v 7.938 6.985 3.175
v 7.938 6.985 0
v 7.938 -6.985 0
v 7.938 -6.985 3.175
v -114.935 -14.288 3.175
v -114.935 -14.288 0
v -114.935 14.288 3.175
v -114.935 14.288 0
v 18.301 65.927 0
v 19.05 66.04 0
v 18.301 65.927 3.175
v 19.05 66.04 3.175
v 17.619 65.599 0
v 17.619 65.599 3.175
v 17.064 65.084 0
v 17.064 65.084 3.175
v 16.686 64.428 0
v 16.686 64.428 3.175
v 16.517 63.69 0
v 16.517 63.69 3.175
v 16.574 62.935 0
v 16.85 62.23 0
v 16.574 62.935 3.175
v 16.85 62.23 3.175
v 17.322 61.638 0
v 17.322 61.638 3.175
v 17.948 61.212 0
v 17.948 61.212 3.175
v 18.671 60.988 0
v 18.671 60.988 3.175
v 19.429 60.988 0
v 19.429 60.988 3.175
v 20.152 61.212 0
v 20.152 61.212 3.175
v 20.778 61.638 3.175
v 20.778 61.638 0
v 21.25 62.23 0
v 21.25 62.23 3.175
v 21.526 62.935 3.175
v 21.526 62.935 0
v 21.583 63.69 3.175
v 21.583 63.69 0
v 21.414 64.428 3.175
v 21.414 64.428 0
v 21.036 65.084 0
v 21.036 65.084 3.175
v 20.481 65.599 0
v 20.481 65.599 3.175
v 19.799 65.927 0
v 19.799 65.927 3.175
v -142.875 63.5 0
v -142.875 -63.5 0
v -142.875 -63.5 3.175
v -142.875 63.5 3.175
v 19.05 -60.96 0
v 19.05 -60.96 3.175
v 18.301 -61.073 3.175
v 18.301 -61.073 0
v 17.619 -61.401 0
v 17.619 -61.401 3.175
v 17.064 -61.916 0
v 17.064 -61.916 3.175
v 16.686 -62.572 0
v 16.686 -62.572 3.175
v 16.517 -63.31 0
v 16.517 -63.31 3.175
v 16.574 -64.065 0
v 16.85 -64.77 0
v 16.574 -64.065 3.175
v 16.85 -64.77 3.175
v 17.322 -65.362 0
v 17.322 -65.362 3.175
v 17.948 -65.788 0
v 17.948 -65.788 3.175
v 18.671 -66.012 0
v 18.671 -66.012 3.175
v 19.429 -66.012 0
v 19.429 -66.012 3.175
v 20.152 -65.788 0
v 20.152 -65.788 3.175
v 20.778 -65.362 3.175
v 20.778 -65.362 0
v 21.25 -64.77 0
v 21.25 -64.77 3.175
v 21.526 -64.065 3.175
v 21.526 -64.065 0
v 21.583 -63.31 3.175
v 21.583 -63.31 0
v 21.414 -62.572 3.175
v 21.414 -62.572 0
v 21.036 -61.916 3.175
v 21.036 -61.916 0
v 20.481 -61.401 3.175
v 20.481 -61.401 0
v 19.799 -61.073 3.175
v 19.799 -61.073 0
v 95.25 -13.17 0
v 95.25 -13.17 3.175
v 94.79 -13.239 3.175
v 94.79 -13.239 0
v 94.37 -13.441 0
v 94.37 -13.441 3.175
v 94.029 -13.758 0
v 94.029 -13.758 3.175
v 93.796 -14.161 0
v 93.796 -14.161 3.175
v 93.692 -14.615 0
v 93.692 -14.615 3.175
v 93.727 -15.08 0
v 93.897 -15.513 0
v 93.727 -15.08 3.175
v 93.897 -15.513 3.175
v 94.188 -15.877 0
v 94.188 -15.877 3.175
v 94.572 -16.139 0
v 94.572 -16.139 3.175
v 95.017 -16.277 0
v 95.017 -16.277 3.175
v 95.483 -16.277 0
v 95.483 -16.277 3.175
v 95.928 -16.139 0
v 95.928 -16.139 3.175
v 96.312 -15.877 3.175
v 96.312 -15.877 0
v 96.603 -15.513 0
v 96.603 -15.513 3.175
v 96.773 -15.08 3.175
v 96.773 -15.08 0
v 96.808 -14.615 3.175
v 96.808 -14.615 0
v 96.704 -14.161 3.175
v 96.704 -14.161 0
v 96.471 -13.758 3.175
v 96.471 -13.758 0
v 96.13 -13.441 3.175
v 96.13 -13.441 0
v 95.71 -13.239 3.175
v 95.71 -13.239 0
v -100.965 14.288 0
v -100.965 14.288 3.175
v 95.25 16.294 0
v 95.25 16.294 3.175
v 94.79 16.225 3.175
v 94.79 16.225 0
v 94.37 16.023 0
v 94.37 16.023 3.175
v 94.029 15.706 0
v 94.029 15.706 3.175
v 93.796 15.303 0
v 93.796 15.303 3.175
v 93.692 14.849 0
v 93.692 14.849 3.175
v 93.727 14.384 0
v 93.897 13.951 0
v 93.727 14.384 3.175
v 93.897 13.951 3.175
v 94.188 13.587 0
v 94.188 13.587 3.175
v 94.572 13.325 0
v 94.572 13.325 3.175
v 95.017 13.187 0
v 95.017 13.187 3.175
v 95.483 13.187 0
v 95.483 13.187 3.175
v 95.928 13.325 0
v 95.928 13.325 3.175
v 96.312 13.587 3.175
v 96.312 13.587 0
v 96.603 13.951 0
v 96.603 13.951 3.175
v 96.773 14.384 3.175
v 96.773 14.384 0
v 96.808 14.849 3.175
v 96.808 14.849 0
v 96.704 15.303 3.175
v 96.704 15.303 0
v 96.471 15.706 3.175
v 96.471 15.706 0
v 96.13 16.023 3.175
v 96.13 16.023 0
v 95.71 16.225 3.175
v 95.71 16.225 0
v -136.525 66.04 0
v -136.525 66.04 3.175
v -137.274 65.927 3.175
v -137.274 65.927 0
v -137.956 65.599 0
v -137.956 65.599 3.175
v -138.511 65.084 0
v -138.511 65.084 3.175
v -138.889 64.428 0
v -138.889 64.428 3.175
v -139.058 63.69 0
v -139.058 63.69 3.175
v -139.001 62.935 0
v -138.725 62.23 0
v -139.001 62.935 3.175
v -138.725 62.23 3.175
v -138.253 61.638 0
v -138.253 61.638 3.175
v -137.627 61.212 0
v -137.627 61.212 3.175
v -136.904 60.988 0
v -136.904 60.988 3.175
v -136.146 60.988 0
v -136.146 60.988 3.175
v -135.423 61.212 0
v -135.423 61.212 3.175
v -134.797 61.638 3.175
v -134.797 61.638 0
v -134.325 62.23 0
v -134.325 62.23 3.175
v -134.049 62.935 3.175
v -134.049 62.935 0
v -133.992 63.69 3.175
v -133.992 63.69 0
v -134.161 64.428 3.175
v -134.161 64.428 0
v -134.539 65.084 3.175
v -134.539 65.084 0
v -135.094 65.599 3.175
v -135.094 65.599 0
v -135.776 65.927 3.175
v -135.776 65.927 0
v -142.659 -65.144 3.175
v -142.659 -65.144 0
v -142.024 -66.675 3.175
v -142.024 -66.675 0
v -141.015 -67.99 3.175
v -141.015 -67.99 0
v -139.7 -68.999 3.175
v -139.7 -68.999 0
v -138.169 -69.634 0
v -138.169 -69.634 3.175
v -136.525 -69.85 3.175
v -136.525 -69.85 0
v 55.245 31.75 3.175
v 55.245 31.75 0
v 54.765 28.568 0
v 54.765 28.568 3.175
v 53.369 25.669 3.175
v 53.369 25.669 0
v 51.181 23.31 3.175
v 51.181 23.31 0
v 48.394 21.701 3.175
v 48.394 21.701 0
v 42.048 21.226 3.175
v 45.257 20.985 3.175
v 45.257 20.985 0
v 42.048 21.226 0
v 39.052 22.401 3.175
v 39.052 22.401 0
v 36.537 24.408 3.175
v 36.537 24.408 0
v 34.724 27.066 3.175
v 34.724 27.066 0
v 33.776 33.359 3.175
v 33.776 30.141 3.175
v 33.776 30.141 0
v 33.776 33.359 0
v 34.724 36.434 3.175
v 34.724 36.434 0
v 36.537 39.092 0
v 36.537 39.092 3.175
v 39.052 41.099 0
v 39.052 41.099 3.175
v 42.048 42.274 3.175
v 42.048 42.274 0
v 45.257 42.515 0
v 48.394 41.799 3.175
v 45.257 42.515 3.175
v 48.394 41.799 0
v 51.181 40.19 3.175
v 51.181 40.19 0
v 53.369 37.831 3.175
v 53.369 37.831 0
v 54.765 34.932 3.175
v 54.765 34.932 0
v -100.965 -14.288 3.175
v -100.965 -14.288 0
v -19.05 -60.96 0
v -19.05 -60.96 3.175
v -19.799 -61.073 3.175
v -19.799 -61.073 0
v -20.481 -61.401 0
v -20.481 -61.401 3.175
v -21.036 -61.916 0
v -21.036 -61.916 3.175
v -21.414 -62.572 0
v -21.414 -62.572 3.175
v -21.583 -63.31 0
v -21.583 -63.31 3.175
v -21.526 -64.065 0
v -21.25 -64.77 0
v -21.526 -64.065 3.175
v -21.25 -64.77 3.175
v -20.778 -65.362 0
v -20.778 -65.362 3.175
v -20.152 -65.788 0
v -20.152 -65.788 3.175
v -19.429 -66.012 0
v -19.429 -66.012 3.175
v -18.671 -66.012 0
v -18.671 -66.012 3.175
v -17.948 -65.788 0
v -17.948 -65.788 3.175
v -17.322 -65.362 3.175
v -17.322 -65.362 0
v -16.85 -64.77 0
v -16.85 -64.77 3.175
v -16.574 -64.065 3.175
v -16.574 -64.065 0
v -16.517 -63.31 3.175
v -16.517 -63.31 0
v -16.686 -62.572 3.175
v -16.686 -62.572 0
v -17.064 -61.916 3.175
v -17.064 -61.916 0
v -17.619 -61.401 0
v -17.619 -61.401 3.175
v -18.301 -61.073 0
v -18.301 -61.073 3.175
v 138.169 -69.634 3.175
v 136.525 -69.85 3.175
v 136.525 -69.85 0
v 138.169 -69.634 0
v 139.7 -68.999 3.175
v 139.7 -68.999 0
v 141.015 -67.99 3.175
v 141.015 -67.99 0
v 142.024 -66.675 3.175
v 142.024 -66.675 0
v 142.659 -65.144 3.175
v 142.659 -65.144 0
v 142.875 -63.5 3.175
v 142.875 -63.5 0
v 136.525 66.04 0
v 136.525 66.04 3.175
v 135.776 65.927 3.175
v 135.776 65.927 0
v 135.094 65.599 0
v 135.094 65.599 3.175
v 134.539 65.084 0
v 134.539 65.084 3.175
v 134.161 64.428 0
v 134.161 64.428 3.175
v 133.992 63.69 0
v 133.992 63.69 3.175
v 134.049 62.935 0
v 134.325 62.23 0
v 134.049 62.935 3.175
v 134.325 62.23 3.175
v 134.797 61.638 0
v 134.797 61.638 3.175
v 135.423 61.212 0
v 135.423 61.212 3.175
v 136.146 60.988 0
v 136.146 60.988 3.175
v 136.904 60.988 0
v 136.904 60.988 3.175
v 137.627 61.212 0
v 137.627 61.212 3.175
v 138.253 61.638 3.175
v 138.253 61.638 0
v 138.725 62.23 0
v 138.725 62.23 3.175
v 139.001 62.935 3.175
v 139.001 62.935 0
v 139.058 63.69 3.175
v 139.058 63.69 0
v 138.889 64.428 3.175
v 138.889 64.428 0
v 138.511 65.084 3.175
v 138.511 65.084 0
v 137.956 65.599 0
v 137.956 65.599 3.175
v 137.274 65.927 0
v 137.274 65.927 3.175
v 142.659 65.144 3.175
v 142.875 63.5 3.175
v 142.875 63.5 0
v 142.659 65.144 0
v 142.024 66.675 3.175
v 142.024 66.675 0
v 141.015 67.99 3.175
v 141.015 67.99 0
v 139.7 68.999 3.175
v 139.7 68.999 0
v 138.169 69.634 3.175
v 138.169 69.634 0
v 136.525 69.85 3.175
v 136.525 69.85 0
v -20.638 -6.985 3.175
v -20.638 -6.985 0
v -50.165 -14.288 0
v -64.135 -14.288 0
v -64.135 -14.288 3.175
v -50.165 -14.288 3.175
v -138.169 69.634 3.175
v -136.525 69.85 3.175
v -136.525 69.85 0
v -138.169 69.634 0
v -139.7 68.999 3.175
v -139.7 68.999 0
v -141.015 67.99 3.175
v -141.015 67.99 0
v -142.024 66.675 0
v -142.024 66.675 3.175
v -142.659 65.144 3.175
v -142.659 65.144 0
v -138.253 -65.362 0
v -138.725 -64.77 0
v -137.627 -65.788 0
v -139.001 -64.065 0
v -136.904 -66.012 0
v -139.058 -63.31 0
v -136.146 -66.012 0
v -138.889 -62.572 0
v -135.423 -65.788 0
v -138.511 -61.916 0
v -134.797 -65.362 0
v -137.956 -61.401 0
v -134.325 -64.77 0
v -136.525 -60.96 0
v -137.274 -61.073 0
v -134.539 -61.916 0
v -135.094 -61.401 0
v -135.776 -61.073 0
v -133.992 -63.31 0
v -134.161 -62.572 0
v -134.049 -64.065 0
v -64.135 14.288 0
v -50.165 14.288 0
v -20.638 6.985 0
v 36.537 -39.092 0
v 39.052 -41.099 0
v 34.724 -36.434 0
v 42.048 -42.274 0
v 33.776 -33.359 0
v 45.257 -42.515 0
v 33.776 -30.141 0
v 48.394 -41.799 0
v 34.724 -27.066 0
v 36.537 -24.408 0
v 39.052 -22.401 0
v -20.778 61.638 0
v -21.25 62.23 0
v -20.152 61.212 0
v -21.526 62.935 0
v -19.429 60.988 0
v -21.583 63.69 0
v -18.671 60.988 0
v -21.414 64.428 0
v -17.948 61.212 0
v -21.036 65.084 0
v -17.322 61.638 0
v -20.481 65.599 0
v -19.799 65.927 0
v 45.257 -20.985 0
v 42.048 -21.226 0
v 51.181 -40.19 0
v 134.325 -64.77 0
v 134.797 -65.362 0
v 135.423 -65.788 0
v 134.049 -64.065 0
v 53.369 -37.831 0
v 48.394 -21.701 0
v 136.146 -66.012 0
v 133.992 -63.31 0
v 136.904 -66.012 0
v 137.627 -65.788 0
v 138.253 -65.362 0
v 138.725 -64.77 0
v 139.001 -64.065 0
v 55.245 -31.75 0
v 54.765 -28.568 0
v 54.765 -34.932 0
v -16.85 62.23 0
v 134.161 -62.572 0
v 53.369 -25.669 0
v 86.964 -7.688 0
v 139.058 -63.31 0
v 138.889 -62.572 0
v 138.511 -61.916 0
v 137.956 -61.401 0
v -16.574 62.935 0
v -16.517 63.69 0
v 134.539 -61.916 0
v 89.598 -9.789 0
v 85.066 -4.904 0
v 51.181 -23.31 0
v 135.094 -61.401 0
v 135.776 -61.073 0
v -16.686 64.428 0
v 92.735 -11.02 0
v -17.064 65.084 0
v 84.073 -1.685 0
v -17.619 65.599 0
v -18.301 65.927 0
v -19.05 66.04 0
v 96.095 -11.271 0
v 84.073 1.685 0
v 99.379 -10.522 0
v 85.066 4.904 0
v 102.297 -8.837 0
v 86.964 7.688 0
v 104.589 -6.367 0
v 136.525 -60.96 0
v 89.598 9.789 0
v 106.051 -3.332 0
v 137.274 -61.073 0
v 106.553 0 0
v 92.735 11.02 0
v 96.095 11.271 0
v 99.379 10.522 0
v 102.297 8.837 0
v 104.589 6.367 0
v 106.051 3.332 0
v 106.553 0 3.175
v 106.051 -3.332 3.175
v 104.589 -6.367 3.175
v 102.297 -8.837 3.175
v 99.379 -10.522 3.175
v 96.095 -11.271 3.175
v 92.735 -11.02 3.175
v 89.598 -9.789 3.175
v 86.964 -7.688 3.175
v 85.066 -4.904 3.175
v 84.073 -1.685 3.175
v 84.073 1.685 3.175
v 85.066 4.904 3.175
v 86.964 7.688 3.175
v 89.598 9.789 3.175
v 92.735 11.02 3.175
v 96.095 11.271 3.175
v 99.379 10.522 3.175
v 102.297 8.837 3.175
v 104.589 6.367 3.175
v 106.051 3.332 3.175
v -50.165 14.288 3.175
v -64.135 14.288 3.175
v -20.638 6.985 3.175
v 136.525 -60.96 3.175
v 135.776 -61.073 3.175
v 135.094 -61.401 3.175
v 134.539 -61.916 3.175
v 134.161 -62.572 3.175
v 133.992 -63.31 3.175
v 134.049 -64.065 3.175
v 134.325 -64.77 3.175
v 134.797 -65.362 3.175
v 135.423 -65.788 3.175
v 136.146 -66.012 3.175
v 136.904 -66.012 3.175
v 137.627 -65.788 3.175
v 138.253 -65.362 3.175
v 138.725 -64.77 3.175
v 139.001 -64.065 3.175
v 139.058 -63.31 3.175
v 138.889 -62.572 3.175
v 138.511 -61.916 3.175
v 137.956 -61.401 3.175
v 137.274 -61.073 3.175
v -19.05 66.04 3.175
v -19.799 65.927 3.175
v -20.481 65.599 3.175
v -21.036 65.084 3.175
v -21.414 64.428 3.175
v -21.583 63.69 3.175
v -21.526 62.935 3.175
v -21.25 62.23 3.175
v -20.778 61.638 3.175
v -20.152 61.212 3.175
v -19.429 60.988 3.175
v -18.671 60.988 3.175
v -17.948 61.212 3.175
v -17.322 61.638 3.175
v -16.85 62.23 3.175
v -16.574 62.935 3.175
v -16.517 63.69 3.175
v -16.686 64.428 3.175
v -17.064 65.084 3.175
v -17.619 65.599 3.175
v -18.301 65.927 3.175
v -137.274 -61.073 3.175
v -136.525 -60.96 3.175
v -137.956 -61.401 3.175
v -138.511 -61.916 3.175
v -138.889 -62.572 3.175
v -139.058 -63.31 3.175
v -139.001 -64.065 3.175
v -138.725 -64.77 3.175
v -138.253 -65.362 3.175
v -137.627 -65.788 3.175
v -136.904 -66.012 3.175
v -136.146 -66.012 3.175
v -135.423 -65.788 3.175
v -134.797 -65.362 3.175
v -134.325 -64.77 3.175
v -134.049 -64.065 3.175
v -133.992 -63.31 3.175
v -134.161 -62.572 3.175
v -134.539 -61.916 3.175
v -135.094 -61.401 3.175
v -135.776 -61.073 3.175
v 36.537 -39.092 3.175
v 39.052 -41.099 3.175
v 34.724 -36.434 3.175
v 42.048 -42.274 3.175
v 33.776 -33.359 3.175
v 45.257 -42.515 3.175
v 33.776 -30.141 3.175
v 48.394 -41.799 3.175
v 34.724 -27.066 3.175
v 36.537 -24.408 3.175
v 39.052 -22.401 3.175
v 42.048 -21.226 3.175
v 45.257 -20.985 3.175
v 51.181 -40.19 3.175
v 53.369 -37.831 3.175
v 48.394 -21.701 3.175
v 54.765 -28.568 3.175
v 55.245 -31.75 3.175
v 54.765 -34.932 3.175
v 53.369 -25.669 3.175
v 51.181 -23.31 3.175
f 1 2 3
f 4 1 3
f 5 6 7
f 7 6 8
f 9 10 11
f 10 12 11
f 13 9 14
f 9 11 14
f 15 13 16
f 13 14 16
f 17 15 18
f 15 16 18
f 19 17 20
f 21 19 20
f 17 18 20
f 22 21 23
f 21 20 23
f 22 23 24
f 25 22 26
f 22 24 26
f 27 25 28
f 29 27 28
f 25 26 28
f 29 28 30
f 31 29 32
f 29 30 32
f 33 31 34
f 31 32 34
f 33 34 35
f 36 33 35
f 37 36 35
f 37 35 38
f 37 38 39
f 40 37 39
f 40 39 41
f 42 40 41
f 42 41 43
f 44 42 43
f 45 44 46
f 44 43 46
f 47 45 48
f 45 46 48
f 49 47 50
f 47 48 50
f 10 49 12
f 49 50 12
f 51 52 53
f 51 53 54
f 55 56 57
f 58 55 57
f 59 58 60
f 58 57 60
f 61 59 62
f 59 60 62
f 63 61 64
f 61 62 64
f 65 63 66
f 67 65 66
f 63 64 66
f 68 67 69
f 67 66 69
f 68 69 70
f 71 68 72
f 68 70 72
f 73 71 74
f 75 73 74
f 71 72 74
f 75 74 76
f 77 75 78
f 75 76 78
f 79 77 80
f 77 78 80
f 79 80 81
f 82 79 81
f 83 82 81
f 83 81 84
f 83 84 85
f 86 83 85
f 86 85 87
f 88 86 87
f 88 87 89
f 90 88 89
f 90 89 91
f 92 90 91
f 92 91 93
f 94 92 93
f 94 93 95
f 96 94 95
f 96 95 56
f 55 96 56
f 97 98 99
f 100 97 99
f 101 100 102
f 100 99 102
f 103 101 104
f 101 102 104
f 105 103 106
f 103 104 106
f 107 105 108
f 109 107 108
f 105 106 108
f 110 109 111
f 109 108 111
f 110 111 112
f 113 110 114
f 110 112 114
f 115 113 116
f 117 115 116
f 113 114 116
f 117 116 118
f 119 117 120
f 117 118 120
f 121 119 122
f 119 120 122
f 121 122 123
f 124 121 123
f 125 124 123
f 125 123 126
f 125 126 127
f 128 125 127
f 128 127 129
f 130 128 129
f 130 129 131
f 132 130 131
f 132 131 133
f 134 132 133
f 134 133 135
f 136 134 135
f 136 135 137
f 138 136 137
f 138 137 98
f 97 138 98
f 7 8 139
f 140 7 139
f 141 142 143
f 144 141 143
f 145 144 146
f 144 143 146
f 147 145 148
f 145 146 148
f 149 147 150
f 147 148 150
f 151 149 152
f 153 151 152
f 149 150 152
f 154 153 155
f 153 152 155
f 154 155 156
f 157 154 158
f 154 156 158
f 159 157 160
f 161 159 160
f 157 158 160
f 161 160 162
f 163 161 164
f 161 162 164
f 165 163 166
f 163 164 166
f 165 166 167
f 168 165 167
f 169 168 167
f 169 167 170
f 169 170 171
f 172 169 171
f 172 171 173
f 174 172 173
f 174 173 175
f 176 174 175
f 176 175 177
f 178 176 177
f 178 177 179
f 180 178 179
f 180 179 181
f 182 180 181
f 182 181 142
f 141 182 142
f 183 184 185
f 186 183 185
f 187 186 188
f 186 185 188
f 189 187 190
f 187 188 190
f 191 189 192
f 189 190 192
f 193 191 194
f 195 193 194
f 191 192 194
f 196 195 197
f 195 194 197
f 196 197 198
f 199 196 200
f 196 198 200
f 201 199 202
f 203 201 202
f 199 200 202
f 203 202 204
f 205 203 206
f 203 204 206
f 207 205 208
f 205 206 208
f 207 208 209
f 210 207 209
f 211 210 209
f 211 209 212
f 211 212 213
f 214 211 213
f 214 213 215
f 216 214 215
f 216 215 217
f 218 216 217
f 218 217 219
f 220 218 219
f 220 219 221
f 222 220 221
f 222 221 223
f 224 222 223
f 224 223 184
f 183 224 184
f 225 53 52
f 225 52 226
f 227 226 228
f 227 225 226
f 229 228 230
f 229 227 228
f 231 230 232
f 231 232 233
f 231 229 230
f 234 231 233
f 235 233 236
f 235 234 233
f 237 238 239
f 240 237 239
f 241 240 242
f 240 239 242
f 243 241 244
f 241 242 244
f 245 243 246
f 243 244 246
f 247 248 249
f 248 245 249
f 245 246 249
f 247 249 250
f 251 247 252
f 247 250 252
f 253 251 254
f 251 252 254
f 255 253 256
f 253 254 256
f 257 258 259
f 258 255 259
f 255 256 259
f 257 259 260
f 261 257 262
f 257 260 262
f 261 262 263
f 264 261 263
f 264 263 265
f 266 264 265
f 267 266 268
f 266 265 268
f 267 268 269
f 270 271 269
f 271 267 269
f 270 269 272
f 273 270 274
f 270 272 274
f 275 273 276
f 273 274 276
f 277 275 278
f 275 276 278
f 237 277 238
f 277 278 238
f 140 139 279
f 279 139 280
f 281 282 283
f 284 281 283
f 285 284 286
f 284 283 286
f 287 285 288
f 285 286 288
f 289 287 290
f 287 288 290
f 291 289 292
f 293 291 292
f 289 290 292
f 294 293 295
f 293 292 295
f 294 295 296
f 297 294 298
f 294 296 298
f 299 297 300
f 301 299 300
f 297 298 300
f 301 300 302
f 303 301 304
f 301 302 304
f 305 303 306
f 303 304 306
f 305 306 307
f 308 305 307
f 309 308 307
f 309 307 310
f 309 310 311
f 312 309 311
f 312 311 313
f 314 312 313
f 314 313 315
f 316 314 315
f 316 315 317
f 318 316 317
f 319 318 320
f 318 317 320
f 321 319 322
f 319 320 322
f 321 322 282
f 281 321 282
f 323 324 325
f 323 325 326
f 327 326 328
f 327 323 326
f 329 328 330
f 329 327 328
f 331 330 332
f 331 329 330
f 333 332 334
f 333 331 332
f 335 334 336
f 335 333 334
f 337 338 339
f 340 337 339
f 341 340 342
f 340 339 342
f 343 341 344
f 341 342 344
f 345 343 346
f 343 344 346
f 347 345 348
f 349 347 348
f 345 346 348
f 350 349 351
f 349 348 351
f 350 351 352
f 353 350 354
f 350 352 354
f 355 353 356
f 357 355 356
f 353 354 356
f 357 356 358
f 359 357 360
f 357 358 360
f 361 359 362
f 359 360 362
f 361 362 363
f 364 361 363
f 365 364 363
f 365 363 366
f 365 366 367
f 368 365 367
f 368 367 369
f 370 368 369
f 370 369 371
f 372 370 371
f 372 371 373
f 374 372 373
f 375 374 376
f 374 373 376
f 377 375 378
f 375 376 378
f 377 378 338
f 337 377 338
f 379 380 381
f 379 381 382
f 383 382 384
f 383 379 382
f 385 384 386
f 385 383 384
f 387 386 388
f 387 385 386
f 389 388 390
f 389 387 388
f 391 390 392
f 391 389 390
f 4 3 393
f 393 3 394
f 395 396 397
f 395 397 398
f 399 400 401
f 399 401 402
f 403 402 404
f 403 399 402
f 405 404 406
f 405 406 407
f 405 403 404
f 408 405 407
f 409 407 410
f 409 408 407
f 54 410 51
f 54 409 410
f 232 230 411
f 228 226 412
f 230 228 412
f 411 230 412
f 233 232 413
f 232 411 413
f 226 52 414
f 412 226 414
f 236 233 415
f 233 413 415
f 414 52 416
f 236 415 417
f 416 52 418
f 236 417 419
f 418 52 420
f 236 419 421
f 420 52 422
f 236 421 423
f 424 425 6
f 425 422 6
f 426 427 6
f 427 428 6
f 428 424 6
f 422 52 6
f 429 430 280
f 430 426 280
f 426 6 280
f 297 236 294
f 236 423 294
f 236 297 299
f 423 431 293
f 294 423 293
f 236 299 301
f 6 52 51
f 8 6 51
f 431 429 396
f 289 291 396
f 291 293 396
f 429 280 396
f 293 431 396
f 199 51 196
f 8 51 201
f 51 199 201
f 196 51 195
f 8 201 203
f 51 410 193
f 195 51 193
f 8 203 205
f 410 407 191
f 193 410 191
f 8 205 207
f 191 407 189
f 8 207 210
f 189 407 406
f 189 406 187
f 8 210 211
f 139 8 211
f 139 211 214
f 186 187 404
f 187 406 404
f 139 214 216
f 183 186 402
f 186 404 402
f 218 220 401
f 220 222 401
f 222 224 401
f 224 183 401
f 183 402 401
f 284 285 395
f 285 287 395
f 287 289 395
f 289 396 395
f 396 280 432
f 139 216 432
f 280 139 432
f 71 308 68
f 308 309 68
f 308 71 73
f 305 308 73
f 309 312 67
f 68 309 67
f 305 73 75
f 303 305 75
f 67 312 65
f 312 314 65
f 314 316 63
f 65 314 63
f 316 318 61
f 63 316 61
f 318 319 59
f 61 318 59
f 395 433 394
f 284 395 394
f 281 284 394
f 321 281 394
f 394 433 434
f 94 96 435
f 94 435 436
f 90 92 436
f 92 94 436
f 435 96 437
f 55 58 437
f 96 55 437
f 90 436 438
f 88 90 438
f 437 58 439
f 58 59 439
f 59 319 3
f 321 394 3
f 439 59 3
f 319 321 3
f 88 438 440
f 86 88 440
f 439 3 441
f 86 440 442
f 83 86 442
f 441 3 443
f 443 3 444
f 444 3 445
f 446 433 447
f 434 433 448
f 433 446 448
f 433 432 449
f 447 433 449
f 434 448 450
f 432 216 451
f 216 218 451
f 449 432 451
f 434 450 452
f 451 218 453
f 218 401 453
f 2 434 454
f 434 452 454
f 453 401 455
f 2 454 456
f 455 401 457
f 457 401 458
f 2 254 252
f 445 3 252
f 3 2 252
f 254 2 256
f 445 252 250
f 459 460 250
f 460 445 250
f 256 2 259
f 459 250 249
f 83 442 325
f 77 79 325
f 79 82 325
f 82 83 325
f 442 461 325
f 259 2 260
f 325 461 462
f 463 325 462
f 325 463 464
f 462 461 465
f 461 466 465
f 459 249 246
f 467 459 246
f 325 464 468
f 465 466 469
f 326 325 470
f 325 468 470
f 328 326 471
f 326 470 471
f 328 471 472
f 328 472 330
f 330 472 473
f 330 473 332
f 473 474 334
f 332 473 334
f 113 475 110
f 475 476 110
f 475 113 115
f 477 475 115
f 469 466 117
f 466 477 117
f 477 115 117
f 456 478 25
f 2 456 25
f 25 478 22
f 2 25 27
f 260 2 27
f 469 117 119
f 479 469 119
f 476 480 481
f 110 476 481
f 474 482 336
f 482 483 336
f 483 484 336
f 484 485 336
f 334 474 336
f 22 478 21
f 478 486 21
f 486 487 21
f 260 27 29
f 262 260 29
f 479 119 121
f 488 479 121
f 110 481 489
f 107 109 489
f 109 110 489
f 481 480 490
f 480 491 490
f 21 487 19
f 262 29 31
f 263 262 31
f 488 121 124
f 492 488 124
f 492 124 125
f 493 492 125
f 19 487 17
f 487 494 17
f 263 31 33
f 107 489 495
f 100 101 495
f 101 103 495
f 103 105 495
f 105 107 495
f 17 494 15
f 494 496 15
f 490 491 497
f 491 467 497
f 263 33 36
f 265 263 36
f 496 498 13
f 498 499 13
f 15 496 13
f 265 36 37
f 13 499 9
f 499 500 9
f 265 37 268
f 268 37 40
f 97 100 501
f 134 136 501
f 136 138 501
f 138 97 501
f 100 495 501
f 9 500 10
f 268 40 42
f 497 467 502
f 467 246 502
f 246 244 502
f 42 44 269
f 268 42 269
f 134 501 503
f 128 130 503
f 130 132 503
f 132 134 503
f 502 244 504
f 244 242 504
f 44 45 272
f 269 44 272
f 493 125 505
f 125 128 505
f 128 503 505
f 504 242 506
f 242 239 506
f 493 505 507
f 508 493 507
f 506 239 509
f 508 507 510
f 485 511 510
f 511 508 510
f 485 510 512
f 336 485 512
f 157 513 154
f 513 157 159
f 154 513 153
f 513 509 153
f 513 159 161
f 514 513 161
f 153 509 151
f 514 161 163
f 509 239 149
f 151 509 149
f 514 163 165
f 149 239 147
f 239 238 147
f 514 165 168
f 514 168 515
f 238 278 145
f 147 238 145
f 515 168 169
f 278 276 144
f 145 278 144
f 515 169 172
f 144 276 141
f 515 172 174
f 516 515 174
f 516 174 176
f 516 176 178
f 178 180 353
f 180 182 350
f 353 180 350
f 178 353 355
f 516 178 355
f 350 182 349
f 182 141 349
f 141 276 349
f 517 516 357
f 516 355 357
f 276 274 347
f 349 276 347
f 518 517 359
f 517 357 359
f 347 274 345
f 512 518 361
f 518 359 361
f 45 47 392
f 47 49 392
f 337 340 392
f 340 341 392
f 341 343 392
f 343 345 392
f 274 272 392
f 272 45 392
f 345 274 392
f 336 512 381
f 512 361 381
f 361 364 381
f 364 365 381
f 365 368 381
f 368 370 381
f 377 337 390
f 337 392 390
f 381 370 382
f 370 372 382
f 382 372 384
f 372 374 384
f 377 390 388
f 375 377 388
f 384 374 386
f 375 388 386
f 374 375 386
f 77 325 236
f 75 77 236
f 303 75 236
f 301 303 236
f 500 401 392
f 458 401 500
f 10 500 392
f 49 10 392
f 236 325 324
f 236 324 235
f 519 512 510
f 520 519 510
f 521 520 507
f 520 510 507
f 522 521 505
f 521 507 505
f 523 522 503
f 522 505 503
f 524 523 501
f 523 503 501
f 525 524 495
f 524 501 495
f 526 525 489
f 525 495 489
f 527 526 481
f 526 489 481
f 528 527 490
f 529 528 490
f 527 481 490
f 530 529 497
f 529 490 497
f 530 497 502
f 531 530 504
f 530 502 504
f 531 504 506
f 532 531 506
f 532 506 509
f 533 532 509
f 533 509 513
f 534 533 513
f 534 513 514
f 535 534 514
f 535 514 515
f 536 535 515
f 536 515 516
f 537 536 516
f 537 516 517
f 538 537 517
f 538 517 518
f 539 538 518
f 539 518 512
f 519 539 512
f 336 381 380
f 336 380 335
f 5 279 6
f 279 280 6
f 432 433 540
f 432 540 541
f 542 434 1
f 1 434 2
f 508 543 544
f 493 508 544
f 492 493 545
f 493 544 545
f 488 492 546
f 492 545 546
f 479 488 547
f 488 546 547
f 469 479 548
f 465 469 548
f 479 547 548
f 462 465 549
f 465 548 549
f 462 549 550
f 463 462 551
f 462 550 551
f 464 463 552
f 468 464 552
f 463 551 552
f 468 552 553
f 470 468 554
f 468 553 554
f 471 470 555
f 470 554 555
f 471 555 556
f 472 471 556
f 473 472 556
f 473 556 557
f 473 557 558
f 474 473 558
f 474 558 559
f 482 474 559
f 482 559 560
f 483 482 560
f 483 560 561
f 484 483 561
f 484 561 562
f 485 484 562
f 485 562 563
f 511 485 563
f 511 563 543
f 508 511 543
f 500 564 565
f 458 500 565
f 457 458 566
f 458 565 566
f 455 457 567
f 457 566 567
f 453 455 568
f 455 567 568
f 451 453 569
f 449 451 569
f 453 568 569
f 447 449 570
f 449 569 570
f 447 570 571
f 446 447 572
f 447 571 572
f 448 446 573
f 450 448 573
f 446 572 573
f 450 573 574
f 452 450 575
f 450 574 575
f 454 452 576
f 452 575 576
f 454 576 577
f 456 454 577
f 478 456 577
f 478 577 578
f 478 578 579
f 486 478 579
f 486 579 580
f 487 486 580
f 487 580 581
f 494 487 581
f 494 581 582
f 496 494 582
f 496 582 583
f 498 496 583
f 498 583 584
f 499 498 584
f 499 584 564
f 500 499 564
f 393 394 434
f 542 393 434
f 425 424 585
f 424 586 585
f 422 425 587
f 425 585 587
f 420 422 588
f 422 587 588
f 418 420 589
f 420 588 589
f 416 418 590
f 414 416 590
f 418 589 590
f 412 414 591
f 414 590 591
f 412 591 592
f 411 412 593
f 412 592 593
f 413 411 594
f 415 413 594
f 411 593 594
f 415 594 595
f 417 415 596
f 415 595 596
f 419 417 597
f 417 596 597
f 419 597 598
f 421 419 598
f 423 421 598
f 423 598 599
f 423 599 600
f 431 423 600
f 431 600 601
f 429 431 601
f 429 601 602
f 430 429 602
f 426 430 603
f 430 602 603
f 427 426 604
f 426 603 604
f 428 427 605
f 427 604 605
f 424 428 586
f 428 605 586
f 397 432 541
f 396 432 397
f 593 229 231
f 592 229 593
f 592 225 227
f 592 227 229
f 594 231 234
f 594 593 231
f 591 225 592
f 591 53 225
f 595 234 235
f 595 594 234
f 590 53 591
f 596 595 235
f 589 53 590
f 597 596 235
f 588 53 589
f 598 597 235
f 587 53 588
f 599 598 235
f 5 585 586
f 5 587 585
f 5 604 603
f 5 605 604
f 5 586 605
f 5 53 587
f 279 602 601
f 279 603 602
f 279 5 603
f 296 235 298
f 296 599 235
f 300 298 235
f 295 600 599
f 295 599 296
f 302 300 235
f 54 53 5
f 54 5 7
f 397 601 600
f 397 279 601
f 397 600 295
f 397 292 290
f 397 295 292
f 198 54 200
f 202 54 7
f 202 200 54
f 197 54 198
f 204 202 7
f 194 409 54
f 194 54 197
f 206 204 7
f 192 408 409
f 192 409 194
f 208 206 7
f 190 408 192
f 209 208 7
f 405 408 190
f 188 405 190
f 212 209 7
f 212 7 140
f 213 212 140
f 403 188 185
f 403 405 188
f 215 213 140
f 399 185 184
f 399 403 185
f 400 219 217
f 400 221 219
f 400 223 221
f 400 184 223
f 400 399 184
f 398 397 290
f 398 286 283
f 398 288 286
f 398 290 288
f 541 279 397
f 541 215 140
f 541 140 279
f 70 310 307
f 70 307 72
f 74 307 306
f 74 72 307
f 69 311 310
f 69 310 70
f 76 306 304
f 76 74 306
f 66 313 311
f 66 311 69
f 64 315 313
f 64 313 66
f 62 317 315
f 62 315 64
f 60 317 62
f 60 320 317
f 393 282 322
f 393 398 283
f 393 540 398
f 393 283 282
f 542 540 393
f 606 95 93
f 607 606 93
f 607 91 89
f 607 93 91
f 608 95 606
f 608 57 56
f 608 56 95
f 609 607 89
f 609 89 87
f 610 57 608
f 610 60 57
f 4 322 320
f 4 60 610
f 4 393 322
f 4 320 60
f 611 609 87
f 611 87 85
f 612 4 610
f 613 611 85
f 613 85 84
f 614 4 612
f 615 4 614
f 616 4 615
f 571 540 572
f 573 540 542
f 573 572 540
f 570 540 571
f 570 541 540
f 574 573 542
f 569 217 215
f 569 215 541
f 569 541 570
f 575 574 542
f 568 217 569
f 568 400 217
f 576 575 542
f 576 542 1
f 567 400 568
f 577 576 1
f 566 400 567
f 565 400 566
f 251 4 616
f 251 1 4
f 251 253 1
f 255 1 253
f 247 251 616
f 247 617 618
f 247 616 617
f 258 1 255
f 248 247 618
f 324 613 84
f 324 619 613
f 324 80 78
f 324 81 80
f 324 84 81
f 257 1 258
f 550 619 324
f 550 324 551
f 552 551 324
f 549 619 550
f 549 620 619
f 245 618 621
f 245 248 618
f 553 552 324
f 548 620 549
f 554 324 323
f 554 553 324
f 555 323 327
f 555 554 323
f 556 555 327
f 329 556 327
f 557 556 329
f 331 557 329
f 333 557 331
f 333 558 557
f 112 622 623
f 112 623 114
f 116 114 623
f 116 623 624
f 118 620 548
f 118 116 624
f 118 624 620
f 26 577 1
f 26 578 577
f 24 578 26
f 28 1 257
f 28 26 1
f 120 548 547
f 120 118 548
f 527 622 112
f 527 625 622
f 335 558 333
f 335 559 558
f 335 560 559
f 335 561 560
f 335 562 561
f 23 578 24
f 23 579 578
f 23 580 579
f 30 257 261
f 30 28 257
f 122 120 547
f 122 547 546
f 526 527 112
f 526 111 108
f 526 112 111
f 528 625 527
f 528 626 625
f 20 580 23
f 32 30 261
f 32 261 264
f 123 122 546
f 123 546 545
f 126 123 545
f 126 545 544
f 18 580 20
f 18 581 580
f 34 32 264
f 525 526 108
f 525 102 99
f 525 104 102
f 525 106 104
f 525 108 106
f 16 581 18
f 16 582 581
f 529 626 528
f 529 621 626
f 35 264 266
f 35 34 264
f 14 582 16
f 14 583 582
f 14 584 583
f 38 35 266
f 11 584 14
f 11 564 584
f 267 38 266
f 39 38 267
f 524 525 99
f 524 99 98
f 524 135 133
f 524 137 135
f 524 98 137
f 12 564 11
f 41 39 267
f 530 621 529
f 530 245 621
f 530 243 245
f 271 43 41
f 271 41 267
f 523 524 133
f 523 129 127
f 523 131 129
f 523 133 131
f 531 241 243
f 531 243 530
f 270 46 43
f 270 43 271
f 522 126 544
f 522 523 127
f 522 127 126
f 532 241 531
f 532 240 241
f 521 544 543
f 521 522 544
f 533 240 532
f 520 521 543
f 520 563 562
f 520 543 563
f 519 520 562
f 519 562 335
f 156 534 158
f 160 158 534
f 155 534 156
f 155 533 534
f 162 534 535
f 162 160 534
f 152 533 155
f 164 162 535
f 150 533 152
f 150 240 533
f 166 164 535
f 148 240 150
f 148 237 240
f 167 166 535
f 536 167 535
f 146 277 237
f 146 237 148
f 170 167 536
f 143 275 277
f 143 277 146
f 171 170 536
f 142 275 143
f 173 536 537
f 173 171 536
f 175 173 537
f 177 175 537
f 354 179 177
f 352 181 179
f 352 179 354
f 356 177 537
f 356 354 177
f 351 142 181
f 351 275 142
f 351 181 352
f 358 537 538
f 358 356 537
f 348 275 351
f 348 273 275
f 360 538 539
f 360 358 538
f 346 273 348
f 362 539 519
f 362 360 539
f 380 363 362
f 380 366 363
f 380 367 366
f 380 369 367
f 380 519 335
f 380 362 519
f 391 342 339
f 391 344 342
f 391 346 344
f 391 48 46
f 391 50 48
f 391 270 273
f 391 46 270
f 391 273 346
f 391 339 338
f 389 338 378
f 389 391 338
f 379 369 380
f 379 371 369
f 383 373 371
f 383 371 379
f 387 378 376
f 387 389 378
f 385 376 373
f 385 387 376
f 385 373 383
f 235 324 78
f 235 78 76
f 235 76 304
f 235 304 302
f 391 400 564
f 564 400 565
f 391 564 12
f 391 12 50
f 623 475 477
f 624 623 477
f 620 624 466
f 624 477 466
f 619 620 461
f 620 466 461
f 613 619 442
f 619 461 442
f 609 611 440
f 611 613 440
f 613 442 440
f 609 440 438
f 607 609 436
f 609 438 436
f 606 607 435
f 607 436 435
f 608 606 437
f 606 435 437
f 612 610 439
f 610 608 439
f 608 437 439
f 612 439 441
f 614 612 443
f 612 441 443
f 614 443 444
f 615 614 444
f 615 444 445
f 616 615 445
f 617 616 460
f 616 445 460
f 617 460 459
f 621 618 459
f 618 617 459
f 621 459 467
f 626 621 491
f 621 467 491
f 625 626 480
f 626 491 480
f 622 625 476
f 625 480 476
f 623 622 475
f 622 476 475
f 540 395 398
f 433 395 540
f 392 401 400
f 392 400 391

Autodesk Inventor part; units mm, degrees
ref_plane "YZ Plane" through (0, 0, 0) normal (1, 0, 0) x (0, 1, 0)
ref_plane "XZ Plane" through (0, 0, 0) normal (0, 1, 0) x (-1, 0, 0)
ref_plane "XY Plane" through (0, 0, 0) normal (0, 0, 1) x (1, 0, 0)
sketch "Sketch1" plane through (0, 0, 0) normal (0, 0, 1) x (1, 0, 0)
  line L0 (0, 97.79) -> (0, -97.79) projected
  line L1 (-200.025, 0) -> (200.025, 0) projected
  line L2 (142.875, -69.85) -> (-142.875, -69.85)
  line L3 (-142.875, -69.85) -> (-142.875, 69.85)
  line L4 (-142.875, 69.85) -> (142.875, 69.85)
  line L5 (142.875, 69.85) -> (142.875, -69.85)
  line L6 (142.875, -69.85) -> (-142.875, 69.85) construction
  line L7 (-142.875, -69.85) -> (142.875, 69.85) construction
  line L8 (-136.525, -63.5) -> (136.525, -63.5) construction
  line L9 (136.525, -63.5) -> (136.525, 63.5) construction
  line L10 (136.525, 63.5) -> (-136.525, 63.5) construction
  line L11 (-136.525, 63.5) -> (-136.525, -63.5) construction
  line L12 (-136.525, -63.5) -> (136.525, 63.5) construction
  line L13 (136.525, -63.5) -> (-136.525, 63.5) construction
  line L14 (-100.965, -14.2875) -> (-114.935, -14.2875)
  line L15 (-114.935, -14.2875) -> (-114.935, 14.2875)
  line L16 (-114.935, 14.2875) -> (-100.965, 14.2875)
  line L17 (-100.965, 14.2875) -> (-100.965, -14.2875)
  line L18 (-100.965, -14.2875) -> (-114.935, 14.2875) construction
  line L19 (-114.935, -14.2875) -> (-100.965, 14.2875) construction
  circle A0 centre (44.45, 31.75) radius 10.795
  circle A1 centre (44.45, -31.75) radius 10.795
  circle A2 centre (95.25, 0) radius 11.303
  circle A3 centre (95.25, 0) radius 30 construction
  line L20 (-64.135, -14.2875) -> (-50.165, -14.2875)
  line L21 (-50.165, -14.2875) -> (-50.165, 14.2875)
  line L22 (-50.165, 14.2875) -> (-64.135, 14.2875)
  line L23 (-64.135, 14.2875) -> (-64.135, -14.2875)
  line L24 (-64.135, -14.2875) -> (-50.165, 14.2875) construction
  line L25 (-50.165, -14.2875) -> (-64.135, 14.2875) construction
  line L26 (7.9375, -6.985) -> (-20.6375, -6.985)
  line L27 (-20.6375, -6.985) -> (-20.6375, 6.985)
  line L28 (-20.6375, 6.985) -> (7.9375, 6.985)
  line L29 (7.9375, 6.985) -> (7.9375, -6.985)
  line L30 (7.9375, -6.985) -> (-20.6375, 6.985) construction
  line L31 (-20.6375, -6.985) -> (7.9375, 6.985) construction
  point P0 (0, 0)
  point P1 (-107.95, 0)
  point P2 (95.25, 14.732)
  point P3 (95.25, -14.732)
  point P4 (-19.05, 63.5)
  point P5 (-19.05, -63.5)
  point P6 (19.05, -63.5)
  point P7 (19.05, 63.5)
  point P8 (-57.15, 0)
  point P9 (-6.35, 0)
  dimension "d0" = 285.75
  dimension "d1" = 139.7
  dimension "d4" = 6.35
  dimension "d5" = 6.35
  dimension "d6" = 13.97
  dimension "d7" = 28.575
  dimension "d15" = 0
  dimension "d16" = 21.59
  dimension "d20" = 22.606
  dimension "d22" = 60
  dimension "d33" = 47.625
  dimension "d34" = 14.732
  dimension "d35" = 14.732
  dimension "d43" = 34.925
  dimension "d44" = 31.75
  dimension "d45" = 31.75
  dimension "d46" = 152.4
  dimension "d47" = 50.8
  dimension "d48" = 19.05
  dimension "d49" = 19.05
  dimension "d50" = 50.8
  dimension "d51" = 50.8
extrude "Extrusion1" add sketch "Sketch1" along normal blind 3.175 contours L4 L5 L1 A2 L29 L28 L0 | L0 L28 L27 L1 L21 L22 L23 L17 L16 L15 L3 L4 | L1 L15 L14 L17 L23 L20 L21 L27 L26 L0 L2 L3 | L5 L2 L0 L26 L29 L1 A2
hole "Hole1" at (-136.525, 63.5, 0) at (-136.525, -63.5, 0) at (136.525, 63.5, 0) at (136.525, -63.5, 0) at (19.05, -63.5, 0) at (-19.05, 63.5, 0) at (19.05, 63.5, 0) at (-19.05, -63.5, 0) direction (0, 0, 1) diameter 5.08 end through all
fillet "Fillet1" radius 6.35 4 edges at (142.875, -69.85, 1.5875) (142.875, 69.85, 1.5875) (-142.875, -69.85, 1.5875) (-142.875, 69.85, 1.5875)
hole "Hole2" at (95.25, 14.732, 0) at (95.25, -14.732, 0) direction (0, 0, 1) diameter 3.1242 end through all
equation "\"d35\" = d34"
